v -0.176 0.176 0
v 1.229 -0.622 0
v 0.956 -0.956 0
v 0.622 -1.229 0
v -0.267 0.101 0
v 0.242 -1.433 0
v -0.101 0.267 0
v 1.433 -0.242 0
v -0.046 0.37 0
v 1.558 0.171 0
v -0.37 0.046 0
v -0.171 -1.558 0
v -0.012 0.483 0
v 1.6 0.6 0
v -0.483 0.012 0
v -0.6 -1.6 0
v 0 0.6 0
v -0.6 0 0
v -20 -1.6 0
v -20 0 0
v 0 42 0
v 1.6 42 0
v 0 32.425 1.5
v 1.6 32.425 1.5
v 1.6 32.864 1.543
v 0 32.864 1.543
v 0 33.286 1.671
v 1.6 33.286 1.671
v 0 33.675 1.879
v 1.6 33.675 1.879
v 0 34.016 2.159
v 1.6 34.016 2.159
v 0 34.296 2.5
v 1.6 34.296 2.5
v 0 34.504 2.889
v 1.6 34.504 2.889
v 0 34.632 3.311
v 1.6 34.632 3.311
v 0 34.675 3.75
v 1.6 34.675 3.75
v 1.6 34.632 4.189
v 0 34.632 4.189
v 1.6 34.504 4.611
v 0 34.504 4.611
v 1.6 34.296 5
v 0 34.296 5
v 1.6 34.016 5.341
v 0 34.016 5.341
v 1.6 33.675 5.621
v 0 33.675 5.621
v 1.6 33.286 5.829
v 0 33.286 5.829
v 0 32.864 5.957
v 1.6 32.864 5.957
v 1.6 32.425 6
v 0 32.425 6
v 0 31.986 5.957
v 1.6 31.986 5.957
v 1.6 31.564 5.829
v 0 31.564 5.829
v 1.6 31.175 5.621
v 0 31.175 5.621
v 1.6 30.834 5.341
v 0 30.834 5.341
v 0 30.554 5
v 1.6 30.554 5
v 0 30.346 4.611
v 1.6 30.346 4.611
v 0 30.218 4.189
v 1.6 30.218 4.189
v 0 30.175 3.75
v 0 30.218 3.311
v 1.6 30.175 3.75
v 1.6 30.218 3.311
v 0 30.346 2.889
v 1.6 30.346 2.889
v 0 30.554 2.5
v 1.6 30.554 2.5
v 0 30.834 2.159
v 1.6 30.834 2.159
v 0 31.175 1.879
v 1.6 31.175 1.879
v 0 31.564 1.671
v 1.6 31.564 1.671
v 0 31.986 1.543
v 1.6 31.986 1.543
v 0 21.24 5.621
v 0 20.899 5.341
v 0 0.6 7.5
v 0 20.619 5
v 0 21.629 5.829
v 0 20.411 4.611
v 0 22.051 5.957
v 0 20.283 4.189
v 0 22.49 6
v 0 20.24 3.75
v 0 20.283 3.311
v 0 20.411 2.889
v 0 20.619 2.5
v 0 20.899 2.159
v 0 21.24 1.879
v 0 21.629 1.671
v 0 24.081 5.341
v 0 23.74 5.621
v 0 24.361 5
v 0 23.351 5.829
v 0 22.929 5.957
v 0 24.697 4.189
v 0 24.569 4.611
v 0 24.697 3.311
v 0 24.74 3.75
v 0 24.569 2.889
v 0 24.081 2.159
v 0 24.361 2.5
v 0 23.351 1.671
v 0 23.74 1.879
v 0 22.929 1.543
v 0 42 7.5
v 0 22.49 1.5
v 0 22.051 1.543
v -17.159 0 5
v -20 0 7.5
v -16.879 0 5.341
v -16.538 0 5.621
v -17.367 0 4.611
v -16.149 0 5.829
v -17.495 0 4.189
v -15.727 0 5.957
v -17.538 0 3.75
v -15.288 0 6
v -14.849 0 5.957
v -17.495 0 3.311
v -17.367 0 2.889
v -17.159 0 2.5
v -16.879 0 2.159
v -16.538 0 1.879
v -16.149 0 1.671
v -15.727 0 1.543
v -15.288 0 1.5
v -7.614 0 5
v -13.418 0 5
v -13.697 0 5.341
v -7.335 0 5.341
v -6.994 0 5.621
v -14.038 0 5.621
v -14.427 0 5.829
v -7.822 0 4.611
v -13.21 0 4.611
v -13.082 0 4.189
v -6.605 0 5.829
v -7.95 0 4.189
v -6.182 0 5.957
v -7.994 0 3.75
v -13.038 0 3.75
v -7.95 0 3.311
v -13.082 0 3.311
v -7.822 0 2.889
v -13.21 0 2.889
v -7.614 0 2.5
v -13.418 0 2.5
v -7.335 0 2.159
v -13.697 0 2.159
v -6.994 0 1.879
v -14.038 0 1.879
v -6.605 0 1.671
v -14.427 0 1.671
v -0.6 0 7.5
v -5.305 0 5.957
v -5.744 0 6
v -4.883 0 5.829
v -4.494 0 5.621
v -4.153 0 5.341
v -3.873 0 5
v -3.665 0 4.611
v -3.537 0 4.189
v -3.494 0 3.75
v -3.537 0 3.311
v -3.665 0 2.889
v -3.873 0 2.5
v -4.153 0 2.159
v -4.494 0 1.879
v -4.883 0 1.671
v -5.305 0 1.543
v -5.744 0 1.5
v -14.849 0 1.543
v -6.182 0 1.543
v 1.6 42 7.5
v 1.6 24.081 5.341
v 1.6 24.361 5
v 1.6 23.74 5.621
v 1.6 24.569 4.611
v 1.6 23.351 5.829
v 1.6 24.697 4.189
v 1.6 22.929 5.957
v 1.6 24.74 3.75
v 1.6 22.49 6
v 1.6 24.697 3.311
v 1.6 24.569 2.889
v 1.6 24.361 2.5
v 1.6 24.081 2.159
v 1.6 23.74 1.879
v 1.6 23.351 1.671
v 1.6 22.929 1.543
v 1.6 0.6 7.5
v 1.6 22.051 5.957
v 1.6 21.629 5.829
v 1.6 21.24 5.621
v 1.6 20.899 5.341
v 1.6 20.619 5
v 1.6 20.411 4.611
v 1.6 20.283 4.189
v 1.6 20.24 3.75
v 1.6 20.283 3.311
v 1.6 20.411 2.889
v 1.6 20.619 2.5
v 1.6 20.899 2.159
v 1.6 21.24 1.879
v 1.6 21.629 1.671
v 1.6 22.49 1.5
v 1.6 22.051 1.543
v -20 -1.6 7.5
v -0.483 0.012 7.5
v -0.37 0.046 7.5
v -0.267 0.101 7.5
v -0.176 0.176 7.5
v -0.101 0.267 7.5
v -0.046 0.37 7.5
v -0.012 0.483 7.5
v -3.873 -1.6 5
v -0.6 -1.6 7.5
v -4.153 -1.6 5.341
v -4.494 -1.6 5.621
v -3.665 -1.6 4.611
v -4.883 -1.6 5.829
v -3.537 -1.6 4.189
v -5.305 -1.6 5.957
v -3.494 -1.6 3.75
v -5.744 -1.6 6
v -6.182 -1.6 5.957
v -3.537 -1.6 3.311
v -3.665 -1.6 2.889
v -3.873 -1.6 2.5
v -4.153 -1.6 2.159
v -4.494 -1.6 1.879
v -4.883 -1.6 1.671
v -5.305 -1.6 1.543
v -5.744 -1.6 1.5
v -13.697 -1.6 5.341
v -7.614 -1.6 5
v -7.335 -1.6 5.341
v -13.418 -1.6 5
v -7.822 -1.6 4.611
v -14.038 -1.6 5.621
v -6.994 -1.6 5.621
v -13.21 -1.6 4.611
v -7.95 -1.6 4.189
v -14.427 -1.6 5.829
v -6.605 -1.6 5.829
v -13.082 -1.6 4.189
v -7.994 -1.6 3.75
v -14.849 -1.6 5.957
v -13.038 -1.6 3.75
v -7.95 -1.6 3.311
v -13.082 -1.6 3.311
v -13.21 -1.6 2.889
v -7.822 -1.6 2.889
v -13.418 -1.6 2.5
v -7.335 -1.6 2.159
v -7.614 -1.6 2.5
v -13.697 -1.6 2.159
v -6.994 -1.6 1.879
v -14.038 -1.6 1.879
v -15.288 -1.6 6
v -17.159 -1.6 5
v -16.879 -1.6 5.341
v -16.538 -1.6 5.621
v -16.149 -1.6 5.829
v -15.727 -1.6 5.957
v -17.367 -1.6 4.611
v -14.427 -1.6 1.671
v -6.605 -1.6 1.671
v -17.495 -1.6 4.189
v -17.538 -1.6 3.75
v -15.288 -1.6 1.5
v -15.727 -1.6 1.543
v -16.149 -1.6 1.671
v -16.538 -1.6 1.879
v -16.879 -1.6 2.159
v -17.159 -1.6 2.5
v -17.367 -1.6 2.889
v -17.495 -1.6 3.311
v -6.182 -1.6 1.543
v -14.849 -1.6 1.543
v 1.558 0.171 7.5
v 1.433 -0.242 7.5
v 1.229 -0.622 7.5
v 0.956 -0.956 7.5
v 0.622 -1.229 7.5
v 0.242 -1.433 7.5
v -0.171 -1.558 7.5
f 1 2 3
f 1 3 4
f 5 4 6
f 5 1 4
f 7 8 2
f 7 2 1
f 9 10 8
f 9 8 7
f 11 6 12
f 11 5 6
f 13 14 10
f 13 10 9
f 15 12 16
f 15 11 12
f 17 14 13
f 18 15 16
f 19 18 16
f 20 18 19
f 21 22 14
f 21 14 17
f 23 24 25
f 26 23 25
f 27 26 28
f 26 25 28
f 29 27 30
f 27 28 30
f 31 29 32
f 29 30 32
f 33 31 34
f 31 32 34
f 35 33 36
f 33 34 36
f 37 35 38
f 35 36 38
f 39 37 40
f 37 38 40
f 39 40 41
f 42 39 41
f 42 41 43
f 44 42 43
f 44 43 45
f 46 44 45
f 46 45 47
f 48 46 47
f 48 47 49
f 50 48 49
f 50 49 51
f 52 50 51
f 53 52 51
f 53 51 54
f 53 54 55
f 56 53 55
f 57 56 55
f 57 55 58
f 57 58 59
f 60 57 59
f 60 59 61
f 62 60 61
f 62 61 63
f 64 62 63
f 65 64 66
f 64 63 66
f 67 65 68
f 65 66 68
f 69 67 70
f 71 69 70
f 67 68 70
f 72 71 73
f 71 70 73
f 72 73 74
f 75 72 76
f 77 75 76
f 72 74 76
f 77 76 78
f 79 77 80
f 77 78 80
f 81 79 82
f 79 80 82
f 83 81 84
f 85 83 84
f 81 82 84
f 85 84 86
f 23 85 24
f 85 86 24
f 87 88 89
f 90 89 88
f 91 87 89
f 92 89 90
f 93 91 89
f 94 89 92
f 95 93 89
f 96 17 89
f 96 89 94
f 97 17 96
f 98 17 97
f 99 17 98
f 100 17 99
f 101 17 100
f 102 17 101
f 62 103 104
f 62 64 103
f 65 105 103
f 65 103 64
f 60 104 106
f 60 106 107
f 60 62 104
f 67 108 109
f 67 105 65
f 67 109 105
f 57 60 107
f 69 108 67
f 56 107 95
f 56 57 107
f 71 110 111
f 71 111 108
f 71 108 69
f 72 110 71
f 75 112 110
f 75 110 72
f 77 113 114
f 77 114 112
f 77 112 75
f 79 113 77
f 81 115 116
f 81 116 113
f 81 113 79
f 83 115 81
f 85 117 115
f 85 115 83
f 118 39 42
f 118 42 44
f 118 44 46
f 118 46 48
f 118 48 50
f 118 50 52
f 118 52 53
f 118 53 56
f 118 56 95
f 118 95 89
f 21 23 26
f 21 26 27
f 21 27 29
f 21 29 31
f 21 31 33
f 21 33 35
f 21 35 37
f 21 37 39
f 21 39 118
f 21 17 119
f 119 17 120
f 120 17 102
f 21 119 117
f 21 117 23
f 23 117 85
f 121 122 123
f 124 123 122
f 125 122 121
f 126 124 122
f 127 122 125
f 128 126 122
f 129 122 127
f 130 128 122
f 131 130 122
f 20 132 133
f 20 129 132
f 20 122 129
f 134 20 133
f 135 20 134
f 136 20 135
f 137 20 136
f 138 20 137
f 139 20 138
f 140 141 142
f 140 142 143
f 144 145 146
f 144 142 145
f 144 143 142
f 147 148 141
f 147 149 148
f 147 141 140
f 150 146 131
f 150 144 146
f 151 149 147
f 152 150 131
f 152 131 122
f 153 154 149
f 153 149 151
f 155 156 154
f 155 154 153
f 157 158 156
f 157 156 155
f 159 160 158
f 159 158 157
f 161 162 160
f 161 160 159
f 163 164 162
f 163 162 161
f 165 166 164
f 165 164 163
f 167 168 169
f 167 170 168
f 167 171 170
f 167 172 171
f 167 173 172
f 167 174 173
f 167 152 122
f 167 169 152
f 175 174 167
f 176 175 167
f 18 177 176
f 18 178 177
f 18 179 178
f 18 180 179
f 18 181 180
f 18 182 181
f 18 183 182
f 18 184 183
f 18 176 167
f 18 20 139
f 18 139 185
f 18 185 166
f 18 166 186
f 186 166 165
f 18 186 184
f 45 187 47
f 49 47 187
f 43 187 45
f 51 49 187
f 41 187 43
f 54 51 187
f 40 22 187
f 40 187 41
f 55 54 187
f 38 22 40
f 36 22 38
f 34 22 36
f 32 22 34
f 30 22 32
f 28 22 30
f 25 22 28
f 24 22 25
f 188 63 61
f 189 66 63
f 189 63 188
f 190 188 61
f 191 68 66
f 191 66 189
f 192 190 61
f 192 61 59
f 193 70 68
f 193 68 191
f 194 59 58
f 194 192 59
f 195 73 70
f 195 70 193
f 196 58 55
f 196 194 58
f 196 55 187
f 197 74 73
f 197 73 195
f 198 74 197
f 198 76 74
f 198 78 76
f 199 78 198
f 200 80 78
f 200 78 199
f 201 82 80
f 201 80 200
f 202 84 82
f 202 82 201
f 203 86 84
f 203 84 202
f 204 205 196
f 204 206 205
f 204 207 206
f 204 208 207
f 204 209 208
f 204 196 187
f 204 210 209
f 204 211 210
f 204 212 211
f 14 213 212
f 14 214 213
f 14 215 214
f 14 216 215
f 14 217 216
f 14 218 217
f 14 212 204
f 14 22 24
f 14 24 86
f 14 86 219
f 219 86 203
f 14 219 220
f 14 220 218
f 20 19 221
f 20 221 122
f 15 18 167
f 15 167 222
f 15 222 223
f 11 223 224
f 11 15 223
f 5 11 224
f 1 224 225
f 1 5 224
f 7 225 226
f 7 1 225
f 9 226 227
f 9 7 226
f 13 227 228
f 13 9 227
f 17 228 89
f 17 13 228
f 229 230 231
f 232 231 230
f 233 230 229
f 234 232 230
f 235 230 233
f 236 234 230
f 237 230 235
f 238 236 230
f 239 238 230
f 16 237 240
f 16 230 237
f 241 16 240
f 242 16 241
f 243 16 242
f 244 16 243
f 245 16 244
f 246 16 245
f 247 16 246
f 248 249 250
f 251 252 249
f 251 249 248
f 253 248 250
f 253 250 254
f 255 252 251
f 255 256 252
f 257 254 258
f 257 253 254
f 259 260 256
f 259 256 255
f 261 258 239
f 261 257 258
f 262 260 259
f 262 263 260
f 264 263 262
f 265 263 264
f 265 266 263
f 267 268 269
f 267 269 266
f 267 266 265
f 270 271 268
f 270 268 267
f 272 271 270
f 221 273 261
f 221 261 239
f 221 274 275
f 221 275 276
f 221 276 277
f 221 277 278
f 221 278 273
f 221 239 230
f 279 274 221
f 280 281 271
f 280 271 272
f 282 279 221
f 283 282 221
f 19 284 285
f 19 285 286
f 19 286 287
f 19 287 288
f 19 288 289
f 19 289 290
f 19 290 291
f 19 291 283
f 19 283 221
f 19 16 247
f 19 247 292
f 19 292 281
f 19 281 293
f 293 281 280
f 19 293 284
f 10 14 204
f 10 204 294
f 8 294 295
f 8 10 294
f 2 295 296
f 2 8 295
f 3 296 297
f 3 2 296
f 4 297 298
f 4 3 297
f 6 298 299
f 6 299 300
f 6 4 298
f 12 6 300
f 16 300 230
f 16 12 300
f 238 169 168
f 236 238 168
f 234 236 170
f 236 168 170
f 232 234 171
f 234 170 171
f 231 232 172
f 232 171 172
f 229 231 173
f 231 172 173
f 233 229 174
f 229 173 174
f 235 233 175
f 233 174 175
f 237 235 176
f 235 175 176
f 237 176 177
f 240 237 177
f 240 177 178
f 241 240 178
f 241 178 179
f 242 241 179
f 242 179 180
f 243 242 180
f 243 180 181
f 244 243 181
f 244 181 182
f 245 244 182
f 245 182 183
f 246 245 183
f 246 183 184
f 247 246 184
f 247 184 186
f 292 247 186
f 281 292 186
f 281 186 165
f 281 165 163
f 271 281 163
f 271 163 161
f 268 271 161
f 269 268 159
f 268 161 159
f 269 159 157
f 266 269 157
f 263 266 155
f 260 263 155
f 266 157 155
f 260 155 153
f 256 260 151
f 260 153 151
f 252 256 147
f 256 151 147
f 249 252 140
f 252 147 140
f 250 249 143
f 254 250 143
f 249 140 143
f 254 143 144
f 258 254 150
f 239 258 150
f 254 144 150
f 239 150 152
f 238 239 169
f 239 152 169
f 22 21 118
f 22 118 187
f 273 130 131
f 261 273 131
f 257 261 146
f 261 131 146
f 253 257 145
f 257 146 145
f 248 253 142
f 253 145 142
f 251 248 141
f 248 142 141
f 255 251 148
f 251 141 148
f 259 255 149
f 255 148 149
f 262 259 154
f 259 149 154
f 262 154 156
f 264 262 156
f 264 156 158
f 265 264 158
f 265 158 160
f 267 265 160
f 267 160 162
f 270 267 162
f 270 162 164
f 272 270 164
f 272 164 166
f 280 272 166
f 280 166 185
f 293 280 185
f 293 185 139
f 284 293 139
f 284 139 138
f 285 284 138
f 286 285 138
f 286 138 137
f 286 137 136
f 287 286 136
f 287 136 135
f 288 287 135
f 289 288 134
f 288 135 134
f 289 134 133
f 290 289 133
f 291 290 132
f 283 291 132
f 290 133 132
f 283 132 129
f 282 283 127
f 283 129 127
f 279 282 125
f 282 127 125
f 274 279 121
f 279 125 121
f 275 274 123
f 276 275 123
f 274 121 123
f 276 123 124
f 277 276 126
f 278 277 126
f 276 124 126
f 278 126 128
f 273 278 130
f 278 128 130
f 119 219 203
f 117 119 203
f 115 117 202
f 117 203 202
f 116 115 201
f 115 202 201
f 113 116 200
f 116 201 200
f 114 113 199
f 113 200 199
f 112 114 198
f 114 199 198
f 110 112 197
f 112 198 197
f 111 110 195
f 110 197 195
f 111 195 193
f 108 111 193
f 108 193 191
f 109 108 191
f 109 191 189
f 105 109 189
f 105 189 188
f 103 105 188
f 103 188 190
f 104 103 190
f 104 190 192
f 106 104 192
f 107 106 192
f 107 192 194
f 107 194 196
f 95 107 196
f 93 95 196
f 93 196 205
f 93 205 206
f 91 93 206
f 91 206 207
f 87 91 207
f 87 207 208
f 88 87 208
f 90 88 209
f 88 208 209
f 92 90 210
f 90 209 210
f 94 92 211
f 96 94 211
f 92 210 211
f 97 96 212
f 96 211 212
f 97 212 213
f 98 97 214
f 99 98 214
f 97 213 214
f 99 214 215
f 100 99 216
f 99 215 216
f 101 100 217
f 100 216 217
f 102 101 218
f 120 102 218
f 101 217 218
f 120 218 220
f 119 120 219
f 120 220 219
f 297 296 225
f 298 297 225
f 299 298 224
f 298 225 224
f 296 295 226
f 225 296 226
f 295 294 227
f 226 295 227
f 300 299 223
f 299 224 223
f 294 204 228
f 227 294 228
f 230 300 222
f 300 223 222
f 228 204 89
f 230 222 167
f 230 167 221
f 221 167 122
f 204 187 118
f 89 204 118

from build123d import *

# Parameters (mm, degrees)
BASE_FLANGE1_DEPTH = 7.5
SKETCH7_R          = 2.25
CUT_EXTRUDE1_DEPTH = 10
SKETCH8_R          = 2.25
CUT_EXTRUDE2_DEPTH = 10


# Sheet-metal steps are written as plain solids
with BuildPart() as part:
    # Sketch1 → Base-Flange1 (new body)
    with BuildSketch(Plane.XY):
        with BuildLine():
            Line((-20, 0), (-0.6, 0))
            ThreePointArc((-0.6, 0), (-0.175735931, 0.175735931), (0, 0.6))
            Line((0, 0.6), (0, 42))
            Line((0, 42), (1.6, 42))
            Line((1.6, 42), (1.6, 0.6))
            ThreePointArc((1.6, 0.6), (0.955634919, -0.955634919), (-0.6, -1.6))
            Line((-0.6, -1.6), (-20, -1.6))
            Line((-20, -1.6), (-20, 0))
        make_face()
    extrude(amount=BASE_FLANGE1_DEPTH)

    # Sketch7 → Cut-Extrude1 (cut)
    with BuildSketch(Plane(origin=(1.6, 0, 0), x_dir=(0, 0, -1), z_dir=(1, 0, 0))):
        with Locations((-3.75, 32.425)):
            Circle(SKETCH7_R)
        with Locations((-3.75, 22.49)):
            Circle(SKETCH7_R)
    extrude(amount=-CUT_EXTRUDE1_DEPTH, mode=Mode.SUBTRACT)

    # Sketch8 → Cut-Extrude2 (cut)
    with BuildSketch(Plane(origin=(0, 0, 0), x_dir=(1, 0, 0), z_dir=(0, 1, 0))):
        with Locations(Location((-15.288441883, -3.75, 0), (0, 0, 270))):
            Circle(SKETCH8_R)
        with Locations(Location((-5.743540806, -3.75, 0), (0, 0, 270))):
            Circle(SKETCH8_R)
    extrude(amount=-CUT_EXTRUDE2_DEPTH, mode=Mode.SUBTRACT)


solid = part.part
